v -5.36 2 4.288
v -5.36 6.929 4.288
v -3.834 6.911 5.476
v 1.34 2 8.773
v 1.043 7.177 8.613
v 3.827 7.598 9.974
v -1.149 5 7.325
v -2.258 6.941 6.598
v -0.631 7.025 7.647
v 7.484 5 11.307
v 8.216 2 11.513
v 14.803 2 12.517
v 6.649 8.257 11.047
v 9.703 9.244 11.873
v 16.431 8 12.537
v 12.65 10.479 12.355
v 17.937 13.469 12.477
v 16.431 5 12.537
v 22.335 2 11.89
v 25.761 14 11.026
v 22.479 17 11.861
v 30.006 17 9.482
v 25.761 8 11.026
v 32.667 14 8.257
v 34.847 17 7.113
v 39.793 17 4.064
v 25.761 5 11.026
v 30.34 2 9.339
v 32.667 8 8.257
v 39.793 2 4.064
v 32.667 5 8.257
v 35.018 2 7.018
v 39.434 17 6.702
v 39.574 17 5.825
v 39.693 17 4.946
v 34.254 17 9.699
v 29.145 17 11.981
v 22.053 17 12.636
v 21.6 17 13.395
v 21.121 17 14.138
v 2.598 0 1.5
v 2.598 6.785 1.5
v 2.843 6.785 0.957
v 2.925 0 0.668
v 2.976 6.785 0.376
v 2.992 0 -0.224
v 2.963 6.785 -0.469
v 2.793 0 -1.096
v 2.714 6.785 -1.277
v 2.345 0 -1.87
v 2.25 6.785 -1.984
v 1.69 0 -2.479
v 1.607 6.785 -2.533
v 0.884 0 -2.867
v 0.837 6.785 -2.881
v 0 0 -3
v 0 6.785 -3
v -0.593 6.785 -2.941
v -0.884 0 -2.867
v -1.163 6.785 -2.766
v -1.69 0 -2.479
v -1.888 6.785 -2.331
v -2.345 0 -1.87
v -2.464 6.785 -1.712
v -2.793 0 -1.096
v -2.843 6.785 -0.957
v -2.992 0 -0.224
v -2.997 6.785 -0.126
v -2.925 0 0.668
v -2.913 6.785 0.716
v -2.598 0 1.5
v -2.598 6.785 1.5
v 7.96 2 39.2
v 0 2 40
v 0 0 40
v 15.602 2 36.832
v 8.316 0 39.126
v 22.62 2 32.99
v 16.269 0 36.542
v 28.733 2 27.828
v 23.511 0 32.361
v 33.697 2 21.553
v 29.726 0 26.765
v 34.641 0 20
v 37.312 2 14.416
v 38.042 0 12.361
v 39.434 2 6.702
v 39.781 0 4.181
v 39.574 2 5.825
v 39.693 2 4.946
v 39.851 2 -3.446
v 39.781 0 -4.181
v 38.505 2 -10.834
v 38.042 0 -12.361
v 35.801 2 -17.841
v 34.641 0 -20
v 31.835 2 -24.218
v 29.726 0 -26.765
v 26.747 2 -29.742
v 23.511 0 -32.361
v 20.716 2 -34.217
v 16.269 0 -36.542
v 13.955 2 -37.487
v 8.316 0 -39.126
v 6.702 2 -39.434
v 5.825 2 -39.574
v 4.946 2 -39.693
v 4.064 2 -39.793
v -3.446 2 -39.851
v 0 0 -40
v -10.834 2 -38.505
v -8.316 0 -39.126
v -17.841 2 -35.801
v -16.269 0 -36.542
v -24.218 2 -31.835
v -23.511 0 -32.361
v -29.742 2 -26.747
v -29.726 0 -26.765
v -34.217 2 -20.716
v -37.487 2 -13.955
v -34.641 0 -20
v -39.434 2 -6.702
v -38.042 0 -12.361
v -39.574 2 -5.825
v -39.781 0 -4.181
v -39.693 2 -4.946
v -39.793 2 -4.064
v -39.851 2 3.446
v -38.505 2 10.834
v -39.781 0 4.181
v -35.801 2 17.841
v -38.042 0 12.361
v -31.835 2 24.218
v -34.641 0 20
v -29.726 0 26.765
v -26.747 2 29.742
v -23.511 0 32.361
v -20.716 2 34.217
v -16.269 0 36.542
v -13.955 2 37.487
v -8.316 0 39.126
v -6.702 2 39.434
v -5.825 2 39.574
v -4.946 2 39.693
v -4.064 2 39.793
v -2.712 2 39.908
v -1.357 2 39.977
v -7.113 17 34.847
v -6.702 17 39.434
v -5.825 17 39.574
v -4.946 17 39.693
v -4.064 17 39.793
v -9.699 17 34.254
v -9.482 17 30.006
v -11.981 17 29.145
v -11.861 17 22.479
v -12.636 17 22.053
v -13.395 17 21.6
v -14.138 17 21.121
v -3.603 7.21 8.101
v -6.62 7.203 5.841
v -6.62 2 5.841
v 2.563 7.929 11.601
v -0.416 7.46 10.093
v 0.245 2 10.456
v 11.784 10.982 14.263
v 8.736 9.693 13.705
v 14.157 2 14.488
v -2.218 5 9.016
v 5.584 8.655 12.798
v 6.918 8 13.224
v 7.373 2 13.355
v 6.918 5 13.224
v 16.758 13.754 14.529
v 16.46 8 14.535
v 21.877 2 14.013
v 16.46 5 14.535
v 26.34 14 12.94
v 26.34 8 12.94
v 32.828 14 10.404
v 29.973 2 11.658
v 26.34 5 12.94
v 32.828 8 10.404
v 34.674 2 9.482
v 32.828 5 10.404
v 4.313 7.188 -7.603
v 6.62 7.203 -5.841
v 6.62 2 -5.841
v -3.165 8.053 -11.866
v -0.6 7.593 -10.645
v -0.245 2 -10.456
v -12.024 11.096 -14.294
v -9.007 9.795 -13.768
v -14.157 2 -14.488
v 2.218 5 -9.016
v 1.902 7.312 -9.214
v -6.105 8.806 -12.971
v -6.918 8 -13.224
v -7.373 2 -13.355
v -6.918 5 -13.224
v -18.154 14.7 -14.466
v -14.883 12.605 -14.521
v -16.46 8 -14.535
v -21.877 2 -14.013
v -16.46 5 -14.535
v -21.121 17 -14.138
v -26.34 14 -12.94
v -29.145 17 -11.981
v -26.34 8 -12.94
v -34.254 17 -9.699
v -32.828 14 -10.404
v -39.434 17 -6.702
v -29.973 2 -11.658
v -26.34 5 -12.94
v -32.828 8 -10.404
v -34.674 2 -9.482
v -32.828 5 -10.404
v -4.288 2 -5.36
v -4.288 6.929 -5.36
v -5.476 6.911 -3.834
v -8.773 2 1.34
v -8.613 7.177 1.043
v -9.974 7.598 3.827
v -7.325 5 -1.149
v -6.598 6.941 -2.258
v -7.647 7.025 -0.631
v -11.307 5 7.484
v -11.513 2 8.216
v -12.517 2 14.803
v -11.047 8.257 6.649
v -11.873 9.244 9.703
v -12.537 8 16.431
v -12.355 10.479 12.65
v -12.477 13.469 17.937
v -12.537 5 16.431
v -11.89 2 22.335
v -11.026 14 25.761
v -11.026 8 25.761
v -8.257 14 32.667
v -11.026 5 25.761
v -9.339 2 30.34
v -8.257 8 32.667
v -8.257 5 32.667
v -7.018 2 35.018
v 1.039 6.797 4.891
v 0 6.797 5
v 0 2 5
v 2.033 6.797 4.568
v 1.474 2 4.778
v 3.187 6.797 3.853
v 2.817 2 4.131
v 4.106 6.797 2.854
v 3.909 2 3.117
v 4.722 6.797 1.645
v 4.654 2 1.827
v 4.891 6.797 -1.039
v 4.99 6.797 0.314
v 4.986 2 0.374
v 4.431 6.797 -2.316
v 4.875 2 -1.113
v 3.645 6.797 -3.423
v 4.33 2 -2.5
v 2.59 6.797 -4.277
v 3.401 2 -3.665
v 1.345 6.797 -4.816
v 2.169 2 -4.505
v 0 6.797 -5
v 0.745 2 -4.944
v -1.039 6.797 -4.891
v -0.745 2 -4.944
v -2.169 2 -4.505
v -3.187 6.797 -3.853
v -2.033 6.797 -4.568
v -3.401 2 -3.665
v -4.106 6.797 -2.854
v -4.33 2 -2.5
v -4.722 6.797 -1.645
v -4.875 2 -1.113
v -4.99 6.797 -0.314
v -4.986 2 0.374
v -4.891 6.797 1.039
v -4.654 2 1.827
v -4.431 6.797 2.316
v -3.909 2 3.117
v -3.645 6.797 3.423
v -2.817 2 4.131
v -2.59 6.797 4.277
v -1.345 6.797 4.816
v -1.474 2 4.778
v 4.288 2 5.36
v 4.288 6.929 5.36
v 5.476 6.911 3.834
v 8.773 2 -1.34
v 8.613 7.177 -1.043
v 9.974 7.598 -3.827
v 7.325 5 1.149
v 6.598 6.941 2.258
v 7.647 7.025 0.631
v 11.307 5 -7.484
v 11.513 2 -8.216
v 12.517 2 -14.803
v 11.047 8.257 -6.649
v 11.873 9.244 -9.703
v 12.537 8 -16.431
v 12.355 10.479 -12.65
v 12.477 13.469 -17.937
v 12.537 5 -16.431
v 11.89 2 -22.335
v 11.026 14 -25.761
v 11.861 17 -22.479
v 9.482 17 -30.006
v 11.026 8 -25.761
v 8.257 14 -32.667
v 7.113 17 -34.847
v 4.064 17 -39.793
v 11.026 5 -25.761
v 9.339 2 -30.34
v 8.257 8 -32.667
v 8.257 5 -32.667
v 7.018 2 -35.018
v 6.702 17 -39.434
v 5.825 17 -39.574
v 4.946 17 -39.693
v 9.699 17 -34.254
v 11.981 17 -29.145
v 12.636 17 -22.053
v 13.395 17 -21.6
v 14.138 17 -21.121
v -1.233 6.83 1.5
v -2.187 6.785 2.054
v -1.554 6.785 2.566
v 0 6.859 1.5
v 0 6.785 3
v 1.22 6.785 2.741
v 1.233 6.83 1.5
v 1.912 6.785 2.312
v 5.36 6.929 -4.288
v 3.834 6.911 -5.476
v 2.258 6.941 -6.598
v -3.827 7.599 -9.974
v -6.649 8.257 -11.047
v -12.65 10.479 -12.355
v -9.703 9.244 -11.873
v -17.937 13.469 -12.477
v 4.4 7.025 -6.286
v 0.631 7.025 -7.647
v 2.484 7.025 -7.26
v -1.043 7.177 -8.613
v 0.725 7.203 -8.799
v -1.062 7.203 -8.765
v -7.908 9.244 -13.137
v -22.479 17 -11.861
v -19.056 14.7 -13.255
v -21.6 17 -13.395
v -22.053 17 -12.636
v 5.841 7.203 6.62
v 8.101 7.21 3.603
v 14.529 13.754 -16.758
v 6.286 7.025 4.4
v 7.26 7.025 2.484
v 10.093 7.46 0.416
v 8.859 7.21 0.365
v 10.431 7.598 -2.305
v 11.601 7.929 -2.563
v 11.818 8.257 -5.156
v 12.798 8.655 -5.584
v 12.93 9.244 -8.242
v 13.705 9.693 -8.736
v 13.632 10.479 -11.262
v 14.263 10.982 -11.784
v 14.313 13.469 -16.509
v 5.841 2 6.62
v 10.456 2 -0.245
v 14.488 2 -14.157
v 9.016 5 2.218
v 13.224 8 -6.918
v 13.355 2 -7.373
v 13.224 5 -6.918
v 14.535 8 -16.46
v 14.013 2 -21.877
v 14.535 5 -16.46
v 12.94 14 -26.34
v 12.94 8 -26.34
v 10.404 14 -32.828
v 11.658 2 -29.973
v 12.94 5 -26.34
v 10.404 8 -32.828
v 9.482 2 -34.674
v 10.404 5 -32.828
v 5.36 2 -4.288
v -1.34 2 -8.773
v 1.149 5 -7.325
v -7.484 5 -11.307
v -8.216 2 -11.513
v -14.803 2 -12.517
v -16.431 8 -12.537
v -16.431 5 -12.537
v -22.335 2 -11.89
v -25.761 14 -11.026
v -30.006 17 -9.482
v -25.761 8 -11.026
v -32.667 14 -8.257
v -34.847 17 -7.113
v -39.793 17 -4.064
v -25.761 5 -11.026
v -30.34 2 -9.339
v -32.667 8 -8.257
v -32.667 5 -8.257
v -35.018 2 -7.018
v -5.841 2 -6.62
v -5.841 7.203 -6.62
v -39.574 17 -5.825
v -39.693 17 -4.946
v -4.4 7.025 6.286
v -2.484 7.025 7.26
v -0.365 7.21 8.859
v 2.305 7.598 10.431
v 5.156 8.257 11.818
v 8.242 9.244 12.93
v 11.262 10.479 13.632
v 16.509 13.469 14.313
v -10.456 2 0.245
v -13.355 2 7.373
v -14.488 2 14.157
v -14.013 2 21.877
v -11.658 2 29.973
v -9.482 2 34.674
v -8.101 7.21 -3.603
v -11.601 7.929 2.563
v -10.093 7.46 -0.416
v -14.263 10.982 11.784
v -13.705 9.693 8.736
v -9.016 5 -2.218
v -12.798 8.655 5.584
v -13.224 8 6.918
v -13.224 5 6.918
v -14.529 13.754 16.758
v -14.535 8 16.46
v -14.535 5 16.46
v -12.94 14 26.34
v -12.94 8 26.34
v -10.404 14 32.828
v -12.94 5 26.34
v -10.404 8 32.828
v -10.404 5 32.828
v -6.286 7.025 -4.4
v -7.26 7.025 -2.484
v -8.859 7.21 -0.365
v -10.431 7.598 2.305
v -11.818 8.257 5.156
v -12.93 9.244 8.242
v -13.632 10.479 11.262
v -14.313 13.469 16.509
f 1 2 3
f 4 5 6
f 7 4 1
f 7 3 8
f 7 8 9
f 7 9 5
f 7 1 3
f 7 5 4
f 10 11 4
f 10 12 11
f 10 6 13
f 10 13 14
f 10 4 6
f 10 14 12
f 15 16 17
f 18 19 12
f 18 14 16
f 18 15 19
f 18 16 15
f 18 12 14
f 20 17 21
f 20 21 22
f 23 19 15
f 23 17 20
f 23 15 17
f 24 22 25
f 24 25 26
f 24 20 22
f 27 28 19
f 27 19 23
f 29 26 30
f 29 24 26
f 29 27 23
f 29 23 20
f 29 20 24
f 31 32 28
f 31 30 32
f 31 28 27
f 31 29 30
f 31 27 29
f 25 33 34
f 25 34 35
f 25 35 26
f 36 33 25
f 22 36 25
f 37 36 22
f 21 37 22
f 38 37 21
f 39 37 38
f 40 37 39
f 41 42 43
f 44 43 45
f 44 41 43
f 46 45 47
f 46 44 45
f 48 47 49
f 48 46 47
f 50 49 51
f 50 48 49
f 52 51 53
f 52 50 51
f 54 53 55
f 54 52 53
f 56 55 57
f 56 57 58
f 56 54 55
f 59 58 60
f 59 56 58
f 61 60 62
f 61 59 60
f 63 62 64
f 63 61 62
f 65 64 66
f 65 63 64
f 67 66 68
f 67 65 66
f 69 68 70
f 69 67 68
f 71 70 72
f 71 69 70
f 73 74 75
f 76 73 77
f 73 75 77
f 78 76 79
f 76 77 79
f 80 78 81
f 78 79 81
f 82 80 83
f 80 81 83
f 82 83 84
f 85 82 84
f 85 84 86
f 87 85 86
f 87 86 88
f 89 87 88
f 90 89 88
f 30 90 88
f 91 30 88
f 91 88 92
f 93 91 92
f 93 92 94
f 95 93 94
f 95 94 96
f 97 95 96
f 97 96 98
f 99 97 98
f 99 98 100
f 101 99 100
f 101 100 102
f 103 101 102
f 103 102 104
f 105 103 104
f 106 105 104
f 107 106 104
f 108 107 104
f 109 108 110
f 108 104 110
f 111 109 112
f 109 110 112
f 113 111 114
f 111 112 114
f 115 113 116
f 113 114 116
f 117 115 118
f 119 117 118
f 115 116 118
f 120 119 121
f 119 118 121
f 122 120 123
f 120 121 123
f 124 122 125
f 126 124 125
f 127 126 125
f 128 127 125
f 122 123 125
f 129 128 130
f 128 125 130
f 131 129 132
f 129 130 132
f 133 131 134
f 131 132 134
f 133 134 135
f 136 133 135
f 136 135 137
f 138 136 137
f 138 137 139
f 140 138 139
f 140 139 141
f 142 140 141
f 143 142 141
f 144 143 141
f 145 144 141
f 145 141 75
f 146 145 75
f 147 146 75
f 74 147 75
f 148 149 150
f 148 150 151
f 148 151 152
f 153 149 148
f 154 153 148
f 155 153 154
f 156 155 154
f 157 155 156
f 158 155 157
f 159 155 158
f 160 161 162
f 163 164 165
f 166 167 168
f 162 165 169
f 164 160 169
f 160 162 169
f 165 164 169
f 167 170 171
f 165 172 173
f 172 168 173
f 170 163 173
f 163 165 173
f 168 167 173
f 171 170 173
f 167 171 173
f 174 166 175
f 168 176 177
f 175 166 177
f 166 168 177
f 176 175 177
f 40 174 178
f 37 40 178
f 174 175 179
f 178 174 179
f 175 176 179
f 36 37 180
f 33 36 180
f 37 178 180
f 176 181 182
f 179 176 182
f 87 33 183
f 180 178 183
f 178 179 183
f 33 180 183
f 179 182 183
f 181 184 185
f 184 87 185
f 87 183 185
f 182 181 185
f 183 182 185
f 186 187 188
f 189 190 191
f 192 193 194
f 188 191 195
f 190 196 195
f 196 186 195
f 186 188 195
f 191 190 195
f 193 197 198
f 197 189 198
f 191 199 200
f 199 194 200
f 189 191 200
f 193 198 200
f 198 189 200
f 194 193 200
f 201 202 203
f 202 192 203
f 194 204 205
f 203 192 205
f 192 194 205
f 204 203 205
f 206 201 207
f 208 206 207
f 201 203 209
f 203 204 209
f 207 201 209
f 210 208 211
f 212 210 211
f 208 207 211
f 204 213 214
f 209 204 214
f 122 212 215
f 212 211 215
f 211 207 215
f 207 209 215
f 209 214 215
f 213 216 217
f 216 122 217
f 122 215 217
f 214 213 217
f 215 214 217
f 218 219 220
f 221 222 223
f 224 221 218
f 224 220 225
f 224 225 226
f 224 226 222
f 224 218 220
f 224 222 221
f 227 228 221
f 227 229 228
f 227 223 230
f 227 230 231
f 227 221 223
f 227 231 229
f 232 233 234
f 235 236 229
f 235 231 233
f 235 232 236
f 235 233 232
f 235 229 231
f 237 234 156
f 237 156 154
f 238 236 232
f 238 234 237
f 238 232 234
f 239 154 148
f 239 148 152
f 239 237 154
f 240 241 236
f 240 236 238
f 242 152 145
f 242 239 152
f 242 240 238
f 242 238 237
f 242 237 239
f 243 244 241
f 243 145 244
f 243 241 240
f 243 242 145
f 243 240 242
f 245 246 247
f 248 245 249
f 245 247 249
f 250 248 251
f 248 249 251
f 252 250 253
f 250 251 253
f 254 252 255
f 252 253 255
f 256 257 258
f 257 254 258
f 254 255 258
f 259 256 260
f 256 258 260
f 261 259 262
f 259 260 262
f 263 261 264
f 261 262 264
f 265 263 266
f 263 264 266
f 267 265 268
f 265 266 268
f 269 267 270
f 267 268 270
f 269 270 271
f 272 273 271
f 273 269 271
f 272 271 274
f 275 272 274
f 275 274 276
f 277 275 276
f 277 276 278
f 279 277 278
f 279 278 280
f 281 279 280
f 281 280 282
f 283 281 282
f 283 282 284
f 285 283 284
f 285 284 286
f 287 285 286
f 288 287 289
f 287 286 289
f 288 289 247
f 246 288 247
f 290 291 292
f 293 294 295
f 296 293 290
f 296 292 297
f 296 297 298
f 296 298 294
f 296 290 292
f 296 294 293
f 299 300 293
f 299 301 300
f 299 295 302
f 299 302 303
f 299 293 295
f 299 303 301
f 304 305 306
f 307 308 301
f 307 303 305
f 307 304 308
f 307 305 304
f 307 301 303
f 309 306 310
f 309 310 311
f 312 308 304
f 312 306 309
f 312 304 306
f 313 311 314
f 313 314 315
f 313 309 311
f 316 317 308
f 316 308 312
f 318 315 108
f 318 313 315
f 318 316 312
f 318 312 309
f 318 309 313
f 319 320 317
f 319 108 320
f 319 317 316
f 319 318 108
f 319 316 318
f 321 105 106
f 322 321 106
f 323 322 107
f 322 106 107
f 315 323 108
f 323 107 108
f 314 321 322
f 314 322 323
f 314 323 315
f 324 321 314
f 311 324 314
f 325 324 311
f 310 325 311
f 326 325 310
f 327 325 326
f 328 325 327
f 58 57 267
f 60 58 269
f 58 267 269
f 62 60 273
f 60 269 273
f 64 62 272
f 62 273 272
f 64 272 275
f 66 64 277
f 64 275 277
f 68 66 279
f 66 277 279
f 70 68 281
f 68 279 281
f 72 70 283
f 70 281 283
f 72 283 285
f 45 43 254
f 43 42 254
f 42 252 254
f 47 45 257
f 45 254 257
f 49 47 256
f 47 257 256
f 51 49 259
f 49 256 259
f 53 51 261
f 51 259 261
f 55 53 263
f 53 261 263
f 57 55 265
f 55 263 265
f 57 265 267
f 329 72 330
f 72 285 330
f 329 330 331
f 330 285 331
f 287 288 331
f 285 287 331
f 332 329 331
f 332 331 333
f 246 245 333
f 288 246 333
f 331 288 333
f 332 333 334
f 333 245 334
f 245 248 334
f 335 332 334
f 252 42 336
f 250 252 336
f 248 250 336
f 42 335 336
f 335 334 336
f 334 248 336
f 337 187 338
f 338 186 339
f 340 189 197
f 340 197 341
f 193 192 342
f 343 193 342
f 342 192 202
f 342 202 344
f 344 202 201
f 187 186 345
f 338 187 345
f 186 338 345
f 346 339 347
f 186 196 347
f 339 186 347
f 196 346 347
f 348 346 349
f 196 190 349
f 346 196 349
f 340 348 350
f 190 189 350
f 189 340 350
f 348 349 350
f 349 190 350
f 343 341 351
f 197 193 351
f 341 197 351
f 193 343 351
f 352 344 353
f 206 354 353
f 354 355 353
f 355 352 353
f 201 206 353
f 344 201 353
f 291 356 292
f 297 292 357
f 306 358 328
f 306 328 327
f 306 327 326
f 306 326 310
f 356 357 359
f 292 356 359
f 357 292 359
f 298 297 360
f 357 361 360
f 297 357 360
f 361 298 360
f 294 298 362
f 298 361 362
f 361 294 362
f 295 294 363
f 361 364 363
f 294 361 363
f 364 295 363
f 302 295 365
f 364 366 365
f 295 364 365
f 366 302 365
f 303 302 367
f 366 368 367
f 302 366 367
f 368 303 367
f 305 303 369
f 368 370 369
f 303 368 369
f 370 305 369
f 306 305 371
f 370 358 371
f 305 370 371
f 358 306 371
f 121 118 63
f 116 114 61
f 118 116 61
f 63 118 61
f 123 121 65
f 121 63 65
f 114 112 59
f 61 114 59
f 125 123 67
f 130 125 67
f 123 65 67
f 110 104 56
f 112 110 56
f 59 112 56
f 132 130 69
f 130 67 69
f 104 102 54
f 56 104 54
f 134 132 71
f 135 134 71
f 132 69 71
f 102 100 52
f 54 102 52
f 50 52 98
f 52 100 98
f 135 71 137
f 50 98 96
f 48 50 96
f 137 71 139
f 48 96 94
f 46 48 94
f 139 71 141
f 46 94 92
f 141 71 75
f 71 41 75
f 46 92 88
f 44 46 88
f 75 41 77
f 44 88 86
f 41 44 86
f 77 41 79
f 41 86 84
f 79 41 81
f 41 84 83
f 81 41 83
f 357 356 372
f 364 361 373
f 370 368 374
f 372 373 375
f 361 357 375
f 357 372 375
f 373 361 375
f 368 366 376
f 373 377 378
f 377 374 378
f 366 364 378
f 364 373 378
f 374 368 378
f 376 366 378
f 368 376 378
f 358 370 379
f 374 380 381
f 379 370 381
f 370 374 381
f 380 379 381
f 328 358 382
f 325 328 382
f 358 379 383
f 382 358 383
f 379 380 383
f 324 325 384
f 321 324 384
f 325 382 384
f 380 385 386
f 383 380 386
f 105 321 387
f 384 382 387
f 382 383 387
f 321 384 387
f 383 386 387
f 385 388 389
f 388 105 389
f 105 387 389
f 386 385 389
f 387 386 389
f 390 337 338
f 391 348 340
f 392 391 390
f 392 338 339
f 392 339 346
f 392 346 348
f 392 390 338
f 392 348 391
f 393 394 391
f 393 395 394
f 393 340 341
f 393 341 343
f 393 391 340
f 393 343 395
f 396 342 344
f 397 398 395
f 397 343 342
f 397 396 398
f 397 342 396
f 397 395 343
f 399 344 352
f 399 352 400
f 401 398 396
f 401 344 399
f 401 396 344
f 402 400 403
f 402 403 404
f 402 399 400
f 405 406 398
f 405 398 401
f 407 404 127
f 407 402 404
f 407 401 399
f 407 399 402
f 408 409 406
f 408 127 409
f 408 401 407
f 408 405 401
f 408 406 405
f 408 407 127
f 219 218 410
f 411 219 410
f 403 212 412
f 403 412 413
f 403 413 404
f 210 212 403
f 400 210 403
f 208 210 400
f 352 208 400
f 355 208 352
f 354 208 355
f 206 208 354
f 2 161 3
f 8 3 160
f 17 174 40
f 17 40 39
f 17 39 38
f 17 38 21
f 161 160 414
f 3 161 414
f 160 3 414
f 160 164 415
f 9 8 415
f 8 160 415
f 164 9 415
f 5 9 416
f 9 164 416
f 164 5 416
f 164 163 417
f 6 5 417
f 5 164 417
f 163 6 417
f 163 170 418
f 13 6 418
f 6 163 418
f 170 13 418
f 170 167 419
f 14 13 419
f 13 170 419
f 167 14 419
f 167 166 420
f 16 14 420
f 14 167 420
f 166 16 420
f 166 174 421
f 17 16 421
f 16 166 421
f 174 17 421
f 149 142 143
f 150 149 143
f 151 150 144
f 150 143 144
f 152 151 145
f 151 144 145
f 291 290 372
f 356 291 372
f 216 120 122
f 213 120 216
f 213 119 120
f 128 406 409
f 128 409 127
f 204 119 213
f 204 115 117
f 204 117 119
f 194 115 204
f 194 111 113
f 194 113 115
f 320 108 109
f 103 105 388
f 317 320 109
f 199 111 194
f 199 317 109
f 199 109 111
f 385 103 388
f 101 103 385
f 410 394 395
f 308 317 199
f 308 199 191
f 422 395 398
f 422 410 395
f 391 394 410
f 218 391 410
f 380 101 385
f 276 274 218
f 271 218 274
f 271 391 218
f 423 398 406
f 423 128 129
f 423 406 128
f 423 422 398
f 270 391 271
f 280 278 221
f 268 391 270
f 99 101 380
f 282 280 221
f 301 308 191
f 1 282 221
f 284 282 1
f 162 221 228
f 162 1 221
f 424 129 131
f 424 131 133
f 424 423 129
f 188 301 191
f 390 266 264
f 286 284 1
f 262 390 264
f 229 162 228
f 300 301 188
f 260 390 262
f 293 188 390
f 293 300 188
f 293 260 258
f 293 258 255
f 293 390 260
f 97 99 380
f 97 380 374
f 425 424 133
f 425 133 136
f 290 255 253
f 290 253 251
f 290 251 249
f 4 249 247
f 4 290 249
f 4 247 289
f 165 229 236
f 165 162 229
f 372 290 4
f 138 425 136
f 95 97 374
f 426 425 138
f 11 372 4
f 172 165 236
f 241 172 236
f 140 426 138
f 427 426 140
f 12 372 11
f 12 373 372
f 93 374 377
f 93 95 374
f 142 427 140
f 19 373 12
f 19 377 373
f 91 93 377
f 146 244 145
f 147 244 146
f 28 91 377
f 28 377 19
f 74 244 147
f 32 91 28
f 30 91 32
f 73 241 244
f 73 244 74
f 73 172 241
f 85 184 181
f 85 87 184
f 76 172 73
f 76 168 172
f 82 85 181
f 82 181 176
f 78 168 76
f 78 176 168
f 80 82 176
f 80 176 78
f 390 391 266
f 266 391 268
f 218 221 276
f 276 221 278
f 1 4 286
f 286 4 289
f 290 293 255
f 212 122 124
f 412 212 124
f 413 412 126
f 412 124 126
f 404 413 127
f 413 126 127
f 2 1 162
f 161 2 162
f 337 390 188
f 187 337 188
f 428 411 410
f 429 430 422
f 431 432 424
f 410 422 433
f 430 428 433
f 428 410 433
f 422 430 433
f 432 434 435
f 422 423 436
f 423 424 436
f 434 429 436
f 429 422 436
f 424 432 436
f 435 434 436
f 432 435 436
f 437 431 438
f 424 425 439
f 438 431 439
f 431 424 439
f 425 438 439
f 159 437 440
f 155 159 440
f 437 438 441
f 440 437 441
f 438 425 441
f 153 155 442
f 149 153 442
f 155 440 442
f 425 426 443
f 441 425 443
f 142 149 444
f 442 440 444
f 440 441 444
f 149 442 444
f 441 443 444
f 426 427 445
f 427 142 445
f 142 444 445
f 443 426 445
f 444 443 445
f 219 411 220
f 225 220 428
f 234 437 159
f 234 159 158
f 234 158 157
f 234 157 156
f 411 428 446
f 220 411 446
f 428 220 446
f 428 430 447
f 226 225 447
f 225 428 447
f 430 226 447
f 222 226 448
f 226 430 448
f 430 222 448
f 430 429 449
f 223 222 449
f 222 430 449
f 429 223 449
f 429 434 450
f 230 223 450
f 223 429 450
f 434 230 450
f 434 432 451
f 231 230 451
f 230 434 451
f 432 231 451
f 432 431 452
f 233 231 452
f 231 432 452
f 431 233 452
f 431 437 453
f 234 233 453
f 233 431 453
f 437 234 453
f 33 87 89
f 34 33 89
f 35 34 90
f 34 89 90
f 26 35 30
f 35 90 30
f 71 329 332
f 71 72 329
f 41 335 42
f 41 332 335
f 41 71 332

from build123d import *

# Parameters (mm, degrees)
SKETCH1_R           = 40
BOSS_EXTRUDE1_DEPTH = 2
SKETCH2_R           = 5
BOSS_EXTRUDE2_DEPTH = 7
CUT_EXTRUDE2_DEPTH  = 58
BOSS_EXTRUDE4_DEPTH = 15
CIRPATTERN1_COUNT   = 4


# Read off the part's stored shape, not the designer's step: Boss-Extrude4
with BuildPart() as part:
    # Sketch1 → Boss-Extrude1 (new body)
    with BuildSketch(Plane(origin=(0, 0, 0), x_dir=(1, 0, 0), z_dir=(0, 1, 0))):
        with Locations(Location((0, 0, 0), (0, 0, 270))):
            Circle(SKETCH1_R)
    extrude(amount=BOSS_EXTRUDE1_DEPTH)

    # Sketch2 → Boss-Extrude2 (add)
    with BuildSketch(Plane(origin=(0, 0, 0), x_dir=(1, 0, 0), z_dir=(0, 1, 0))):
        with Locations(Location((0, 0, 0), (0, 0, 270))):
            Circle(SKETCH2_R)
    extrude(amount=BOSS_EXTRUDE2_DEPTH)

    # Sketch4 → Cut-Extrude2 (cut, through all)
    with BuildSketch(Plane(origin=(0, 0, 0), x_dir=(1, 0, 0), z_dir=(0, 1, 0))):
        with BuildLine():
            Line((-2.598076211, -1.5), (2.598076211, -1.5))
            ThreePointArc((2.598076211, -1.5), (0, 3), (-2.598076211, -1.5))
        make_face()
    extrude(amount=CUT_EXTRUDE2_DEPTH, mode=Mode.SUBTRACT)

    # Boss-Extrude4 outline → Boss-Extrude4 (add)
    with BuildSketch(Plane(origin=(0, 2, 0), x_dir=(1, 0, 0), z_dir=(0, 1, 0))):
        with BuildLine():
            Line((5.360007285, 4.288004046), (6.620393902, 5.840880595))
            add(Edge.make_bspline(
                [(6.620393902, 5.840880595), (4.446591581, 7.60523936), (-2.240614046, 11.838382972), (-11.595270921, 14.60910996), (-21.325153615, 14.461577349), (-32.769869479, 10.987725064), (-39.434498844, 6.70226088)],
                knots=[0, 0, 0, 0.0625, 0.1875, 0.3125, 0.4375, 0.597789977, 0.597789977, 0.597789977], degree=2))
            ThreePointArc((-39.434498844, 6.70226088), (-39.635737327, 5.385937855), (-39.793049423, 4.063645853))
            add(Edge.make_bspline(
                [(5.360007285, 4.288004046), (3.271766893, 5.982916783), (-3.097296011, 10.009630326), (-11.871370928, 12.604159995), (-20.990596912, 12.469062744), (-32.556083101, 8.970033013), (-39.793049423, 4.063645853)],
                knots=[0, 0, 0, 0.0625, 0.1875, 0.3125, 0.4375, 0.615564575, 0.615564575, 0.615564575], degree=2))
        make_face()
    boss_extrude4 = extrude(amount=BOSS_EXTRUDE4_DEPTH)

    # CirPattern1: Boss-Extrude4 ×4 about axis
    cirpattern1_axis = Axis((0, 7, 0), (0, 1, 0))
    for i in range(1, CIRPATTERN1_COUNT):
        add(boss_extrude4.rotate(cirpattern1_axis, i * 360 / CIRPATTERN1_COUNT))

    # Sketch6 → Cut-Revolve1 (revolve, cut)
    with BuildSketch(Plane.XY, mode=Mode.PRIVATE) as cut_revolve1_sk:
        with BuildLine():
            Line((0, 7), (0, 17))
            Line((0, 17), (-25.416272602, 17))
            add(Edge.make_bspline(
                [(0, 7), (-15.082792744, 5.256181573), (-25.416272602, 17)],
                knots=[0, 0, 0, 1, 1, 1], degree=2))
        make_face()
    revolve(cut_revolve1_sk.sketch.rotate(Axis((0, 7, 0), (0, 1, 0)), 270), axis=Axis((0, 7, 0), (0, 1, 0)), mode=Mode.SUBTRACT)


solid = part.part
